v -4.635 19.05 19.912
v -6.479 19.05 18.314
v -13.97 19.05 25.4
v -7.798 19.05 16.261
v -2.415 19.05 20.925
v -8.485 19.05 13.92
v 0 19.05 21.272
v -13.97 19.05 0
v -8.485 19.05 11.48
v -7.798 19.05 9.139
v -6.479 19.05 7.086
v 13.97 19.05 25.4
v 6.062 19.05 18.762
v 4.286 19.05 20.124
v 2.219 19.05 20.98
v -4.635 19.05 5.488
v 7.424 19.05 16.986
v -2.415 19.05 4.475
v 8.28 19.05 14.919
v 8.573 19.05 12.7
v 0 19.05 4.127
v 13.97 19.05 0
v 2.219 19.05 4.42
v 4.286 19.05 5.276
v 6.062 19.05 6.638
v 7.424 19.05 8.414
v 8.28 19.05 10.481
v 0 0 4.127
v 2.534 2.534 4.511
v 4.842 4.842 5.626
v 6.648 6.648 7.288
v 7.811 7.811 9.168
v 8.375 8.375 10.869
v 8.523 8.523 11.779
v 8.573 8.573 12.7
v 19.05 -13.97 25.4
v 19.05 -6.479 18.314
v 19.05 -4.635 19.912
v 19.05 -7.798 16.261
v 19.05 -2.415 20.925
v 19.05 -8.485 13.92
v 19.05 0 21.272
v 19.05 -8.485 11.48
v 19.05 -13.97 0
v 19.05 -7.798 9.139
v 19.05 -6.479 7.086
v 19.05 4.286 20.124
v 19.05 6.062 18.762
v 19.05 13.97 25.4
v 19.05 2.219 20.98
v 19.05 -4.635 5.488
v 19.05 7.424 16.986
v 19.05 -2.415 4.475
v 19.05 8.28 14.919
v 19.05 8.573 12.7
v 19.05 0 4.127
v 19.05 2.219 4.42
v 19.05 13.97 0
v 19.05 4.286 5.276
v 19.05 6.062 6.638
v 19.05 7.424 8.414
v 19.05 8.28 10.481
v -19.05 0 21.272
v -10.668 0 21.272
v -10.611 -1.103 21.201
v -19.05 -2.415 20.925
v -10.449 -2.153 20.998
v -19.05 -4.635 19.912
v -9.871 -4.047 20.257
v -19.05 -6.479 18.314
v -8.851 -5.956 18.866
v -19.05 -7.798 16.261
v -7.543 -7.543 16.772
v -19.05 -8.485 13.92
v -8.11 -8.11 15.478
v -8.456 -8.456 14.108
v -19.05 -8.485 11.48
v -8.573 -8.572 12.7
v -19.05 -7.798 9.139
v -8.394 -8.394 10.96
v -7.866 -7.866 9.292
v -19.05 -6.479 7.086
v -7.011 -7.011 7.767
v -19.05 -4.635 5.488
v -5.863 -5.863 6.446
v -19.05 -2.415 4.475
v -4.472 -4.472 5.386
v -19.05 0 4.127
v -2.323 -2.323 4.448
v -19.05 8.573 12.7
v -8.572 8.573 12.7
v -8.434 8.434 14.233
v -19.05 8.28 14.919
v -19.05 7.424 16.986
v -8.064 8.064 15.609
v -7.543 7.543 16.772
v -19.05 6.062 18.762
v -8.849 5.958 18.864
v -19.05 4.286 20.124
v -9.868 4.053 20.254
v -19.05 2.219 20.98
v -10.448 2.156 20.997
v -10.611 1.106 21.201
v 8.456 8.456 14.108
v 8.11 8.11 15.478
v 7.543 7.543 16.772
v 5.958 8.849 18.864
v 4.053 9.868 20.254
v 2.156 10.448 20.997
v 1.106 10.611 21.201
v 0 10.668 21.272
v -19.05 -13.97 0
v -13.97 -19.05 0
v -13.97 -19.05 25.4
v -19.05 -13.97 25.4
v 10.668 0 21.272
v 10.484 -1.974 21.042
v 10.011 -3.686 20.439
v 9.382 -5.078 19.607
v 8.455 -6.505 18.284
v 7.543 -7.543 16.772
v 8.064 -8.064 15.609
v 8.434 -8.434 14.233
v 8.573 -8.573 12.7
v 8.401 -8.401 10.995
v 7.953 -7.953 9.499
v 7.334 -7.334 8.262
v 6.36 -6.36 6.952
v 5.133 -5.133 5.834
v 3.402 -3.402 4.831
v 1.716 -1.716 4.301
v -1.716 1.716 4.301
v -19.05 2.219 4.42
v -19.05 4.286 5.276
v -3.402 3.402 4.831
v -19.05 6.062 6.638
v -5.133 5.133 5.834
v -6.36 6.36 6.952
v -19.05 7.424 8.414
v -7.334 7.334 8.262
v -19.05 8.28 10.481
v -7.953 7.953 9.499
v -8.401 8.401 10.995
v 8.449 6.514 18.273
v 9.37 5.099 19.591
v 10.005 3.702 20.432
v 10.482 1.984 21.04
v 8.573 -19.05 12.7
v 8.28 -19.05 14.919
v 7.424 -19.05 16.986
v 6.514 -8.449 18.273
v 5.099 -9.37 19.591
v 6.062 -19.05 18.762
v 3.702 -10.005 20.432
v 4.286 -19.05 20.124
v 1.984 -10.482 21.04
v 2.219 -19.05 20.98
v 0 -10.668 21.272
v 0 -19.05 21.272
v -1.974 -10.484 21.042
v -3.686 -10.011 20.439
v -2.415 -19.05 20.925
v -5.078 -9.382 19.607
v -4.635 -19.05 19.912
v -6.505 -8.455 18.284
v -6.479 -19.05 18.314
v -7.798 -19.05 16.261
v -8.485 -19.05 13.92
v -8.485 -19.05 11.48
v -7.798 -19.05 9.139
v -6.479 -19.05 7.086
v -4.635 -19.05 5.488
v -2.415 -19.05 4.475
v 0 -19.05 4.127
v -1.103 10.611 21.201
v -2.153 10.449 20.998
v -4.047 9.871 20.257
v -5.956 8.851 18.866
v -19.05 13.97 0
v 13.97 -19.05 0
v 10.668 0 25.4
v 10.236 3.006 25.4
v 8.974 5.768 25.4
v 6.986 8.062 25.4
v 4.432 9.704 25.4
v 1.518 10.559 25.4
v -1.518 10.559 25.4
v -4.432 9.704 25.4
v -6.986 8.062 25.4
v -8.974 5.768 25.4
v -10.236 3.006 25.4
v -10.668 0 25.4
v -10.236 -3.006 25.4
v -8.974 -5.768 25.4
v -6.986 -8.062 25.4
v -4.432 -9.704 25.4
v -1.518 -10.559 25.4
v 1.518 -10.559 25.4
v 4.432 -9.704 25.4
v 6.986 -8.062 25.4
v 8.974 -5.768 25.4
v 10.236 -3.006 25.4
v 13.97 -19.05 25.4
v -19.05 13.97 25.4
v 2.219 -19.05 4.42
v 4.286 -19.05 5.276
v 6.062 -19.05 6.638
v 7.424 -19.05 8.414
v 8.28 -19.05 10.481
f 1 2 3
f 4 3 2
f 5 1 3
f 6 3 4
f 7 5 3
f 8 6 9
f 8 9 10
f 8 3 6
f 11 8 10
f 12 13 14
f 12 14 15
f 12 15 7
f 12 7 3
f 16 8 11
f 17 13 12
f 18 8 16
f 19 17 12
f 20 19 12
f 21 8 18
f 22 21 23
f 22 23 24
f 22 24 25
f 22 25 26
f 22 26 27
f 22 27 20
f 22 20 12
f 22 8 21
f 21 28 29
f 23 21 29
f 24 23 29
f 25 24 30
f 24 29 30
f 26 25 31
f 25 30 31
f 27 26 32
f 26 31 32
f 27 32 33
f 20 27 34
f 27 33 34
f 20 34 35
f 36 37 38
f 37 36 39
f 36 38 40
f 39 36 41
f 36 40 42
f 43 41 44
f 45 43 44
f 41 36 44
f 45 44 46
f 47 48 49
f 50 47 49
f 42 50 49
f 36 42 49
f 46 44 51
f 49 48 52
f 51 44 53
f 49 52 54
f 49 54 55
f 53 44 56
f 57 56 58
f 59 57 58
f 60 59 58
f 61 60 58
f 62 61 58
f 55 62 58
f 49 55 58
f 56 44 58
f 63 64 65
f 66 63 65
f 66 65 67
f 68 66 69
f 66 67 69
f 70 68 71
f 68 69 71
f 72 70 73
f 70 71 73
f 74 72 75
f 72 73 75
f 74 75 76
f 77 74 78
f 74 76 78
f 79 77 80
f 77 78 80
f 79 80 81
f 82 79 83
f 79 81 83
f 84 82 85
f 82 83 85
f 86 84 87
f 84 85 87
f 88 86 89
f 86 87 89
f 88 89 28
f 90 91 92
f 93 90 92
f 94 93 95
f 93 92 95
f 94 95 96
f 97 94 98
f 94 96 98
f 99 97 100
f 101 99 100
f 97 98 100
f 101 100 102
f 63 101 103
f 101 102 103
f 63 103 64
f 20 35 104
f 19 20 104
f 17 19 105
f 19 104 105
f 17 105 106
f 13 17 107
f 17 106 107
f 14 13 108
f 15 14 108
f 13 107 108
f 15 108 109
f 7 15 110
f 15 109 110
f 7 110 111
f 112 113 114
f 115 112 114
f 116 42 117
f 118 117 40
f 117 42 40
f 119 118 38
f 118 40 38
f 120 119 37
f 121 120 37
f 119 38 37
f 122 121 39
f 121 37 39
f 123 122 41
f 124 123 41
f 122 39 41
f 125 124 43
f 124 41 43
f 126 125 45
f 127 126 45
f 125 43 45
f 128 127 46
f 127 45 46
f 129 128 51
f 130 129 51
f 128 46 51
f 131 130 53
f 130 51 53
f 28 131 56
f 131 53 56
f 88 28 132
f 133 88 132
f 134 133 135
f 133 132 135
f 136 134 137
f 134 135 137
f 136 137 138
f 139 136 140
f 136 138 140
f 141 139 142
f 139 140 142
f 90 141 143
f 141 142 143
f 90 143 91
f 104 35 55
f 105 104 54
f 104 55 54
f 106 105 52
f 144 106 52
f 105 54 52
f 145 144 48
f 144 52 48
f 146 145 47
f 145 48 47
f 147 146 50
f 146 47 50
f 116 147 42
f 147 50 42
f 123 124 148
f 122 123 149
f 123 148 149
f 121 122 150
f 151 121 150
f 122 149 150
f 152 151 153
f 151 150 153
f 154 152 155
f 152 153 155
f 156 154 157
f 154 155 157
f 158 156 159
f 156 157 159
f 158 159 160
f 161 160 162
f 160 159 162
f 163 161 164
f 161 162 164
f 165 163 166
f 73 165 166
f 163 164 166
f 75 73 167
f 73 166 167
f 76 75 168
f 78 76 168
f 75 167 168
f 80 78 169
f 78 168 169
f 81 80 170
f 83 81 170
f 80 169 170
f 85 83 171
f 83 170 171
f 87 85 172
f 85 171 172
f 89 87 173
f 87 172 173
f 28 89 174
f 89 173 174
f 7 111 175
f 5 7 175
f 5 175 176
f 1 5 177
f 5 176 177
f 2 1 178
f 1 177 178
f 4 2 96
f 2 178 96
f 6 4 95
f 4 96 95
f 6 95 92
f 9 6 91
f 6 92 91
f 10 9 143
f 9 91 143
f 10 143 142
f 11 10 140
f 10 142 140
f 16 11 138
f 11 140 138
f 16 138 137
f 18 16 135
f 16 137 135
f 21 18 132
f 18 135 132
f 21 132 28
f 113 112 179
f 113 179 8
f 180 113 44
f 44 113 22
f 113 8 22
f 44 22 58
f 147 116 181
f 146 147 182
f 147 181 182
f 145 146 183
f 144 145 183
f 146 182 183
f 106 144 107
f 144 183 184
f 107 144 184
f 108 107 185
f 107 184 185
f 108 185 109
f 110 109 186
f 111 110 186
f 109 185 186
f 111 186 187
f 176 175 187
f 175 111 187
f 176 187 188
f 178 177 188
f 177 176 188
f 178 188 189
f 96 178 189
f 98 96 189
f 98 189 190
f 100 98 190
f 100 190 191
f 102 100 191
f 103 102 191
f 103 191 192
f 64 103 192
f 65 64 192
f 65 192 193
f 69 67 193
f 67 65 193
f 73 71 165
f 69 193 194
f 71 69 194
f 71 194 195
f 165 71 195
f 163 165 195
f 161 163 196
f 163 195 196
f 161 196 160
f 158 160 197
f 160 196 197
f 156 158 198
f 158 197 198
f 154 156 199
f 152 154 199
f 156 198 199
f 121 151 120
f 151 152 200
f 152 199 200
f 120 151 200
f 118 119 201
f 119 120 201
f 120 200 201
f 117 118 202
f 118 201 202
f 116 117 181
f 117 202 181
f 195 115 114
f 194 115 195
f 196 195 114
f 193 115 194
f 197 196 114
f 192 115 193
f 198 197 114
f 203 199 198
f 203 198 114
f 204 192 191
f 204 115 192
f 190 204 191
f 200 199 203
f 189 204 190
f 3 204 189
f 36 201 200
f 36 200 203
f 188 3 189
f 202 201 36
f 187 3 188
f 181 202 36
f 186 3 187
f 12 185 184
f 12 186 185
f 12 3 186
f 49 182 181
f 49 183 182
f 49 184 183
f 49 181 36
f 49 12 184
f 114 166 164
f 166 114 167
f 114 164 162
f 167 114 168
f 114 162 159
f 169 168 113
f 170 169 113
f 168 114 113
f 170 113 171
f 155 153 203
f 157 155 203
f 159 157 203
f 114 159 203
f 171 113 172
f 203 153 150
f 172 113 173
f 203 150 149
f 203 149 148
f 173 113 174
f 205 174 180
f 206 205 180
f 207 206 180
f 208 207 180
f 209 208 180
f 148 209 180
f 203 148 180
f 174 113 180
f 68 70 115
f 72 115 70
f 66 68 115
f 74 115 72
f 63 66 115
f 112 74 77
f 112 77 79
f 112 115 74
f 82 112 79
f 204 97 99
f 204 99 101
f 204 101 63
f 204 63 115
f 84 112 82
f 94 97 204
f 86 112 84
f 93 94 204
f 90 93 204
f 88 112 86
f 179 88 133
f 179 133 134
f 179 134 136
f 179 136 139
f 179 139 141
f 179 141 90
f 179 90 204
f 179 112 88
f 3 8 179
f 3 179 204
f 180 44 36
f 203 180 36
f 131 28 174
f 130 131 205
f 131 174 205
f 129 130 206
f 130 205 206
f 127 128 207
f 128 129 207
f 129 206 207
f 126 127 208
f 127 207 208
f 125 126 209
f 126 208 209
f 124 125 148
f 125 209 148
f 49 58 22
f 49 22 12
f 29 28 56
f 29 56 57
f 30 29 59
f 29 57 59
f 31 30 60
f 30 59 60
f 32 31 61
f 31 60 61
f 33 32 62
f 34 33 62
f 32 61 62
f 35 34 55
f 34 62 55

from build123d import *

# Parameters (mm, degrees)
F0_W     = 38.1
F0_H     = 38.1
F1_DEPTH = 25.4
F4_DEPTH = 76.2
F6_DEPTH = 76.2
F2_R     = 10.668
F7_DEPTH = 12.7
F8_SIZE  = 5.08


with BuildPart() as f1:
    # F0 (on Top) → F1 (new body)
    with BuildSketch(Plane.XY):
        Rectangle(F0_W, F0_H)
    extrude(amount=F1_DEPTH)

    # F3 (on face) → F4 (cut)
    with BuildSketch(Plane.XZ.offset(19.05)):
        with BuildLine():
            ThreePointArc((0, 21.2725), (-8.5725, 12.7), (0, 4.1275))
            Line((0, 4.1275), (0, 12.7))
            Line((0, 12.7), (0, 21.2725))
        make_face()
        with BuildLine():
            Line((0, 12.7), (0, 4.1275))
            ThreePointArc((0, 4.1275), (6.061673, 6.638327), (8.5725, 12.7))
            ThreePointArc((8.5725, 12.7), (6.061673, 18.761673), (0, 21.2725))
            Line((0, 21.2725), (0, 12.7))
        make_face()
    extrude(amount=-F4_DEPTH, mode=Mode.SUBTRACT)

    # F5 (on face) → F6 (cut)
    with BuildSketch(Plane.YZ.offset(19.05)):
        with BuildLine():
            ThreePointArc((0, 21.2725), (-8.5725, 12.7), (0, 4.1275))
            Line((0, 4.1275), (0, 12.7))
            Line((0, 12.7), (0, 21.2725))
        make_face()
        with BuildLine():
            Line((0, 12.7), (0, 4.1275))
            ThreePointArc((0, 4.1275), (6.061673, 6.638327), (8.5725, 12.7))
            ThreePointArc((8.5725, 12.7), (6.061673, 18.761673), (0, 21.2725))
            Line((0, 21.2725), (0, 12.7))
        make_face()
    extrude(amount=-F6_DEPTH, mode=Mode.SUBTRACT)

    # F2 (on face) → F7 (cut)
    with BuildSketch(Plane.XY.offset(25.4)):
        Circle(F2_R)
    extrude(amount=-F7_DEPTH, mode=Mode.SUBTRACT)

    # F8
    f8_edges = [f1.edges().sort_by_distance(p)[0] for p in [
        (-19.05, 19.05, 12.7),
        (19.05, 19.05, 12.7),
        (19.05, -19.05, 12.7),
        (-19.05, -19.05, 12.7),
    ]]
    chamfer(f8_edges, length=F8_SIZE)


solid = f1.part
